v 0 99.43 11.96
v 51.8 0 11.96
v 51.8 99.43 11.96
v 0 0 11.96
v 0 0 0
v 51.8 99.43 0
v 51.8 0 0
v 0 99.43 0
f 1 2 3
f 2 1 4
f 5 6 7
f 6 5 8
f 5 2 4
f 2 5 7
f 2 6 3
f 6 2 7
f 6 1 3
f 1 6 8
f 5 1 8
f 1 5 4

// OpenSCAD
// Mega 
cube([51.8,99.43,11.96],centre=true); // all non-official
